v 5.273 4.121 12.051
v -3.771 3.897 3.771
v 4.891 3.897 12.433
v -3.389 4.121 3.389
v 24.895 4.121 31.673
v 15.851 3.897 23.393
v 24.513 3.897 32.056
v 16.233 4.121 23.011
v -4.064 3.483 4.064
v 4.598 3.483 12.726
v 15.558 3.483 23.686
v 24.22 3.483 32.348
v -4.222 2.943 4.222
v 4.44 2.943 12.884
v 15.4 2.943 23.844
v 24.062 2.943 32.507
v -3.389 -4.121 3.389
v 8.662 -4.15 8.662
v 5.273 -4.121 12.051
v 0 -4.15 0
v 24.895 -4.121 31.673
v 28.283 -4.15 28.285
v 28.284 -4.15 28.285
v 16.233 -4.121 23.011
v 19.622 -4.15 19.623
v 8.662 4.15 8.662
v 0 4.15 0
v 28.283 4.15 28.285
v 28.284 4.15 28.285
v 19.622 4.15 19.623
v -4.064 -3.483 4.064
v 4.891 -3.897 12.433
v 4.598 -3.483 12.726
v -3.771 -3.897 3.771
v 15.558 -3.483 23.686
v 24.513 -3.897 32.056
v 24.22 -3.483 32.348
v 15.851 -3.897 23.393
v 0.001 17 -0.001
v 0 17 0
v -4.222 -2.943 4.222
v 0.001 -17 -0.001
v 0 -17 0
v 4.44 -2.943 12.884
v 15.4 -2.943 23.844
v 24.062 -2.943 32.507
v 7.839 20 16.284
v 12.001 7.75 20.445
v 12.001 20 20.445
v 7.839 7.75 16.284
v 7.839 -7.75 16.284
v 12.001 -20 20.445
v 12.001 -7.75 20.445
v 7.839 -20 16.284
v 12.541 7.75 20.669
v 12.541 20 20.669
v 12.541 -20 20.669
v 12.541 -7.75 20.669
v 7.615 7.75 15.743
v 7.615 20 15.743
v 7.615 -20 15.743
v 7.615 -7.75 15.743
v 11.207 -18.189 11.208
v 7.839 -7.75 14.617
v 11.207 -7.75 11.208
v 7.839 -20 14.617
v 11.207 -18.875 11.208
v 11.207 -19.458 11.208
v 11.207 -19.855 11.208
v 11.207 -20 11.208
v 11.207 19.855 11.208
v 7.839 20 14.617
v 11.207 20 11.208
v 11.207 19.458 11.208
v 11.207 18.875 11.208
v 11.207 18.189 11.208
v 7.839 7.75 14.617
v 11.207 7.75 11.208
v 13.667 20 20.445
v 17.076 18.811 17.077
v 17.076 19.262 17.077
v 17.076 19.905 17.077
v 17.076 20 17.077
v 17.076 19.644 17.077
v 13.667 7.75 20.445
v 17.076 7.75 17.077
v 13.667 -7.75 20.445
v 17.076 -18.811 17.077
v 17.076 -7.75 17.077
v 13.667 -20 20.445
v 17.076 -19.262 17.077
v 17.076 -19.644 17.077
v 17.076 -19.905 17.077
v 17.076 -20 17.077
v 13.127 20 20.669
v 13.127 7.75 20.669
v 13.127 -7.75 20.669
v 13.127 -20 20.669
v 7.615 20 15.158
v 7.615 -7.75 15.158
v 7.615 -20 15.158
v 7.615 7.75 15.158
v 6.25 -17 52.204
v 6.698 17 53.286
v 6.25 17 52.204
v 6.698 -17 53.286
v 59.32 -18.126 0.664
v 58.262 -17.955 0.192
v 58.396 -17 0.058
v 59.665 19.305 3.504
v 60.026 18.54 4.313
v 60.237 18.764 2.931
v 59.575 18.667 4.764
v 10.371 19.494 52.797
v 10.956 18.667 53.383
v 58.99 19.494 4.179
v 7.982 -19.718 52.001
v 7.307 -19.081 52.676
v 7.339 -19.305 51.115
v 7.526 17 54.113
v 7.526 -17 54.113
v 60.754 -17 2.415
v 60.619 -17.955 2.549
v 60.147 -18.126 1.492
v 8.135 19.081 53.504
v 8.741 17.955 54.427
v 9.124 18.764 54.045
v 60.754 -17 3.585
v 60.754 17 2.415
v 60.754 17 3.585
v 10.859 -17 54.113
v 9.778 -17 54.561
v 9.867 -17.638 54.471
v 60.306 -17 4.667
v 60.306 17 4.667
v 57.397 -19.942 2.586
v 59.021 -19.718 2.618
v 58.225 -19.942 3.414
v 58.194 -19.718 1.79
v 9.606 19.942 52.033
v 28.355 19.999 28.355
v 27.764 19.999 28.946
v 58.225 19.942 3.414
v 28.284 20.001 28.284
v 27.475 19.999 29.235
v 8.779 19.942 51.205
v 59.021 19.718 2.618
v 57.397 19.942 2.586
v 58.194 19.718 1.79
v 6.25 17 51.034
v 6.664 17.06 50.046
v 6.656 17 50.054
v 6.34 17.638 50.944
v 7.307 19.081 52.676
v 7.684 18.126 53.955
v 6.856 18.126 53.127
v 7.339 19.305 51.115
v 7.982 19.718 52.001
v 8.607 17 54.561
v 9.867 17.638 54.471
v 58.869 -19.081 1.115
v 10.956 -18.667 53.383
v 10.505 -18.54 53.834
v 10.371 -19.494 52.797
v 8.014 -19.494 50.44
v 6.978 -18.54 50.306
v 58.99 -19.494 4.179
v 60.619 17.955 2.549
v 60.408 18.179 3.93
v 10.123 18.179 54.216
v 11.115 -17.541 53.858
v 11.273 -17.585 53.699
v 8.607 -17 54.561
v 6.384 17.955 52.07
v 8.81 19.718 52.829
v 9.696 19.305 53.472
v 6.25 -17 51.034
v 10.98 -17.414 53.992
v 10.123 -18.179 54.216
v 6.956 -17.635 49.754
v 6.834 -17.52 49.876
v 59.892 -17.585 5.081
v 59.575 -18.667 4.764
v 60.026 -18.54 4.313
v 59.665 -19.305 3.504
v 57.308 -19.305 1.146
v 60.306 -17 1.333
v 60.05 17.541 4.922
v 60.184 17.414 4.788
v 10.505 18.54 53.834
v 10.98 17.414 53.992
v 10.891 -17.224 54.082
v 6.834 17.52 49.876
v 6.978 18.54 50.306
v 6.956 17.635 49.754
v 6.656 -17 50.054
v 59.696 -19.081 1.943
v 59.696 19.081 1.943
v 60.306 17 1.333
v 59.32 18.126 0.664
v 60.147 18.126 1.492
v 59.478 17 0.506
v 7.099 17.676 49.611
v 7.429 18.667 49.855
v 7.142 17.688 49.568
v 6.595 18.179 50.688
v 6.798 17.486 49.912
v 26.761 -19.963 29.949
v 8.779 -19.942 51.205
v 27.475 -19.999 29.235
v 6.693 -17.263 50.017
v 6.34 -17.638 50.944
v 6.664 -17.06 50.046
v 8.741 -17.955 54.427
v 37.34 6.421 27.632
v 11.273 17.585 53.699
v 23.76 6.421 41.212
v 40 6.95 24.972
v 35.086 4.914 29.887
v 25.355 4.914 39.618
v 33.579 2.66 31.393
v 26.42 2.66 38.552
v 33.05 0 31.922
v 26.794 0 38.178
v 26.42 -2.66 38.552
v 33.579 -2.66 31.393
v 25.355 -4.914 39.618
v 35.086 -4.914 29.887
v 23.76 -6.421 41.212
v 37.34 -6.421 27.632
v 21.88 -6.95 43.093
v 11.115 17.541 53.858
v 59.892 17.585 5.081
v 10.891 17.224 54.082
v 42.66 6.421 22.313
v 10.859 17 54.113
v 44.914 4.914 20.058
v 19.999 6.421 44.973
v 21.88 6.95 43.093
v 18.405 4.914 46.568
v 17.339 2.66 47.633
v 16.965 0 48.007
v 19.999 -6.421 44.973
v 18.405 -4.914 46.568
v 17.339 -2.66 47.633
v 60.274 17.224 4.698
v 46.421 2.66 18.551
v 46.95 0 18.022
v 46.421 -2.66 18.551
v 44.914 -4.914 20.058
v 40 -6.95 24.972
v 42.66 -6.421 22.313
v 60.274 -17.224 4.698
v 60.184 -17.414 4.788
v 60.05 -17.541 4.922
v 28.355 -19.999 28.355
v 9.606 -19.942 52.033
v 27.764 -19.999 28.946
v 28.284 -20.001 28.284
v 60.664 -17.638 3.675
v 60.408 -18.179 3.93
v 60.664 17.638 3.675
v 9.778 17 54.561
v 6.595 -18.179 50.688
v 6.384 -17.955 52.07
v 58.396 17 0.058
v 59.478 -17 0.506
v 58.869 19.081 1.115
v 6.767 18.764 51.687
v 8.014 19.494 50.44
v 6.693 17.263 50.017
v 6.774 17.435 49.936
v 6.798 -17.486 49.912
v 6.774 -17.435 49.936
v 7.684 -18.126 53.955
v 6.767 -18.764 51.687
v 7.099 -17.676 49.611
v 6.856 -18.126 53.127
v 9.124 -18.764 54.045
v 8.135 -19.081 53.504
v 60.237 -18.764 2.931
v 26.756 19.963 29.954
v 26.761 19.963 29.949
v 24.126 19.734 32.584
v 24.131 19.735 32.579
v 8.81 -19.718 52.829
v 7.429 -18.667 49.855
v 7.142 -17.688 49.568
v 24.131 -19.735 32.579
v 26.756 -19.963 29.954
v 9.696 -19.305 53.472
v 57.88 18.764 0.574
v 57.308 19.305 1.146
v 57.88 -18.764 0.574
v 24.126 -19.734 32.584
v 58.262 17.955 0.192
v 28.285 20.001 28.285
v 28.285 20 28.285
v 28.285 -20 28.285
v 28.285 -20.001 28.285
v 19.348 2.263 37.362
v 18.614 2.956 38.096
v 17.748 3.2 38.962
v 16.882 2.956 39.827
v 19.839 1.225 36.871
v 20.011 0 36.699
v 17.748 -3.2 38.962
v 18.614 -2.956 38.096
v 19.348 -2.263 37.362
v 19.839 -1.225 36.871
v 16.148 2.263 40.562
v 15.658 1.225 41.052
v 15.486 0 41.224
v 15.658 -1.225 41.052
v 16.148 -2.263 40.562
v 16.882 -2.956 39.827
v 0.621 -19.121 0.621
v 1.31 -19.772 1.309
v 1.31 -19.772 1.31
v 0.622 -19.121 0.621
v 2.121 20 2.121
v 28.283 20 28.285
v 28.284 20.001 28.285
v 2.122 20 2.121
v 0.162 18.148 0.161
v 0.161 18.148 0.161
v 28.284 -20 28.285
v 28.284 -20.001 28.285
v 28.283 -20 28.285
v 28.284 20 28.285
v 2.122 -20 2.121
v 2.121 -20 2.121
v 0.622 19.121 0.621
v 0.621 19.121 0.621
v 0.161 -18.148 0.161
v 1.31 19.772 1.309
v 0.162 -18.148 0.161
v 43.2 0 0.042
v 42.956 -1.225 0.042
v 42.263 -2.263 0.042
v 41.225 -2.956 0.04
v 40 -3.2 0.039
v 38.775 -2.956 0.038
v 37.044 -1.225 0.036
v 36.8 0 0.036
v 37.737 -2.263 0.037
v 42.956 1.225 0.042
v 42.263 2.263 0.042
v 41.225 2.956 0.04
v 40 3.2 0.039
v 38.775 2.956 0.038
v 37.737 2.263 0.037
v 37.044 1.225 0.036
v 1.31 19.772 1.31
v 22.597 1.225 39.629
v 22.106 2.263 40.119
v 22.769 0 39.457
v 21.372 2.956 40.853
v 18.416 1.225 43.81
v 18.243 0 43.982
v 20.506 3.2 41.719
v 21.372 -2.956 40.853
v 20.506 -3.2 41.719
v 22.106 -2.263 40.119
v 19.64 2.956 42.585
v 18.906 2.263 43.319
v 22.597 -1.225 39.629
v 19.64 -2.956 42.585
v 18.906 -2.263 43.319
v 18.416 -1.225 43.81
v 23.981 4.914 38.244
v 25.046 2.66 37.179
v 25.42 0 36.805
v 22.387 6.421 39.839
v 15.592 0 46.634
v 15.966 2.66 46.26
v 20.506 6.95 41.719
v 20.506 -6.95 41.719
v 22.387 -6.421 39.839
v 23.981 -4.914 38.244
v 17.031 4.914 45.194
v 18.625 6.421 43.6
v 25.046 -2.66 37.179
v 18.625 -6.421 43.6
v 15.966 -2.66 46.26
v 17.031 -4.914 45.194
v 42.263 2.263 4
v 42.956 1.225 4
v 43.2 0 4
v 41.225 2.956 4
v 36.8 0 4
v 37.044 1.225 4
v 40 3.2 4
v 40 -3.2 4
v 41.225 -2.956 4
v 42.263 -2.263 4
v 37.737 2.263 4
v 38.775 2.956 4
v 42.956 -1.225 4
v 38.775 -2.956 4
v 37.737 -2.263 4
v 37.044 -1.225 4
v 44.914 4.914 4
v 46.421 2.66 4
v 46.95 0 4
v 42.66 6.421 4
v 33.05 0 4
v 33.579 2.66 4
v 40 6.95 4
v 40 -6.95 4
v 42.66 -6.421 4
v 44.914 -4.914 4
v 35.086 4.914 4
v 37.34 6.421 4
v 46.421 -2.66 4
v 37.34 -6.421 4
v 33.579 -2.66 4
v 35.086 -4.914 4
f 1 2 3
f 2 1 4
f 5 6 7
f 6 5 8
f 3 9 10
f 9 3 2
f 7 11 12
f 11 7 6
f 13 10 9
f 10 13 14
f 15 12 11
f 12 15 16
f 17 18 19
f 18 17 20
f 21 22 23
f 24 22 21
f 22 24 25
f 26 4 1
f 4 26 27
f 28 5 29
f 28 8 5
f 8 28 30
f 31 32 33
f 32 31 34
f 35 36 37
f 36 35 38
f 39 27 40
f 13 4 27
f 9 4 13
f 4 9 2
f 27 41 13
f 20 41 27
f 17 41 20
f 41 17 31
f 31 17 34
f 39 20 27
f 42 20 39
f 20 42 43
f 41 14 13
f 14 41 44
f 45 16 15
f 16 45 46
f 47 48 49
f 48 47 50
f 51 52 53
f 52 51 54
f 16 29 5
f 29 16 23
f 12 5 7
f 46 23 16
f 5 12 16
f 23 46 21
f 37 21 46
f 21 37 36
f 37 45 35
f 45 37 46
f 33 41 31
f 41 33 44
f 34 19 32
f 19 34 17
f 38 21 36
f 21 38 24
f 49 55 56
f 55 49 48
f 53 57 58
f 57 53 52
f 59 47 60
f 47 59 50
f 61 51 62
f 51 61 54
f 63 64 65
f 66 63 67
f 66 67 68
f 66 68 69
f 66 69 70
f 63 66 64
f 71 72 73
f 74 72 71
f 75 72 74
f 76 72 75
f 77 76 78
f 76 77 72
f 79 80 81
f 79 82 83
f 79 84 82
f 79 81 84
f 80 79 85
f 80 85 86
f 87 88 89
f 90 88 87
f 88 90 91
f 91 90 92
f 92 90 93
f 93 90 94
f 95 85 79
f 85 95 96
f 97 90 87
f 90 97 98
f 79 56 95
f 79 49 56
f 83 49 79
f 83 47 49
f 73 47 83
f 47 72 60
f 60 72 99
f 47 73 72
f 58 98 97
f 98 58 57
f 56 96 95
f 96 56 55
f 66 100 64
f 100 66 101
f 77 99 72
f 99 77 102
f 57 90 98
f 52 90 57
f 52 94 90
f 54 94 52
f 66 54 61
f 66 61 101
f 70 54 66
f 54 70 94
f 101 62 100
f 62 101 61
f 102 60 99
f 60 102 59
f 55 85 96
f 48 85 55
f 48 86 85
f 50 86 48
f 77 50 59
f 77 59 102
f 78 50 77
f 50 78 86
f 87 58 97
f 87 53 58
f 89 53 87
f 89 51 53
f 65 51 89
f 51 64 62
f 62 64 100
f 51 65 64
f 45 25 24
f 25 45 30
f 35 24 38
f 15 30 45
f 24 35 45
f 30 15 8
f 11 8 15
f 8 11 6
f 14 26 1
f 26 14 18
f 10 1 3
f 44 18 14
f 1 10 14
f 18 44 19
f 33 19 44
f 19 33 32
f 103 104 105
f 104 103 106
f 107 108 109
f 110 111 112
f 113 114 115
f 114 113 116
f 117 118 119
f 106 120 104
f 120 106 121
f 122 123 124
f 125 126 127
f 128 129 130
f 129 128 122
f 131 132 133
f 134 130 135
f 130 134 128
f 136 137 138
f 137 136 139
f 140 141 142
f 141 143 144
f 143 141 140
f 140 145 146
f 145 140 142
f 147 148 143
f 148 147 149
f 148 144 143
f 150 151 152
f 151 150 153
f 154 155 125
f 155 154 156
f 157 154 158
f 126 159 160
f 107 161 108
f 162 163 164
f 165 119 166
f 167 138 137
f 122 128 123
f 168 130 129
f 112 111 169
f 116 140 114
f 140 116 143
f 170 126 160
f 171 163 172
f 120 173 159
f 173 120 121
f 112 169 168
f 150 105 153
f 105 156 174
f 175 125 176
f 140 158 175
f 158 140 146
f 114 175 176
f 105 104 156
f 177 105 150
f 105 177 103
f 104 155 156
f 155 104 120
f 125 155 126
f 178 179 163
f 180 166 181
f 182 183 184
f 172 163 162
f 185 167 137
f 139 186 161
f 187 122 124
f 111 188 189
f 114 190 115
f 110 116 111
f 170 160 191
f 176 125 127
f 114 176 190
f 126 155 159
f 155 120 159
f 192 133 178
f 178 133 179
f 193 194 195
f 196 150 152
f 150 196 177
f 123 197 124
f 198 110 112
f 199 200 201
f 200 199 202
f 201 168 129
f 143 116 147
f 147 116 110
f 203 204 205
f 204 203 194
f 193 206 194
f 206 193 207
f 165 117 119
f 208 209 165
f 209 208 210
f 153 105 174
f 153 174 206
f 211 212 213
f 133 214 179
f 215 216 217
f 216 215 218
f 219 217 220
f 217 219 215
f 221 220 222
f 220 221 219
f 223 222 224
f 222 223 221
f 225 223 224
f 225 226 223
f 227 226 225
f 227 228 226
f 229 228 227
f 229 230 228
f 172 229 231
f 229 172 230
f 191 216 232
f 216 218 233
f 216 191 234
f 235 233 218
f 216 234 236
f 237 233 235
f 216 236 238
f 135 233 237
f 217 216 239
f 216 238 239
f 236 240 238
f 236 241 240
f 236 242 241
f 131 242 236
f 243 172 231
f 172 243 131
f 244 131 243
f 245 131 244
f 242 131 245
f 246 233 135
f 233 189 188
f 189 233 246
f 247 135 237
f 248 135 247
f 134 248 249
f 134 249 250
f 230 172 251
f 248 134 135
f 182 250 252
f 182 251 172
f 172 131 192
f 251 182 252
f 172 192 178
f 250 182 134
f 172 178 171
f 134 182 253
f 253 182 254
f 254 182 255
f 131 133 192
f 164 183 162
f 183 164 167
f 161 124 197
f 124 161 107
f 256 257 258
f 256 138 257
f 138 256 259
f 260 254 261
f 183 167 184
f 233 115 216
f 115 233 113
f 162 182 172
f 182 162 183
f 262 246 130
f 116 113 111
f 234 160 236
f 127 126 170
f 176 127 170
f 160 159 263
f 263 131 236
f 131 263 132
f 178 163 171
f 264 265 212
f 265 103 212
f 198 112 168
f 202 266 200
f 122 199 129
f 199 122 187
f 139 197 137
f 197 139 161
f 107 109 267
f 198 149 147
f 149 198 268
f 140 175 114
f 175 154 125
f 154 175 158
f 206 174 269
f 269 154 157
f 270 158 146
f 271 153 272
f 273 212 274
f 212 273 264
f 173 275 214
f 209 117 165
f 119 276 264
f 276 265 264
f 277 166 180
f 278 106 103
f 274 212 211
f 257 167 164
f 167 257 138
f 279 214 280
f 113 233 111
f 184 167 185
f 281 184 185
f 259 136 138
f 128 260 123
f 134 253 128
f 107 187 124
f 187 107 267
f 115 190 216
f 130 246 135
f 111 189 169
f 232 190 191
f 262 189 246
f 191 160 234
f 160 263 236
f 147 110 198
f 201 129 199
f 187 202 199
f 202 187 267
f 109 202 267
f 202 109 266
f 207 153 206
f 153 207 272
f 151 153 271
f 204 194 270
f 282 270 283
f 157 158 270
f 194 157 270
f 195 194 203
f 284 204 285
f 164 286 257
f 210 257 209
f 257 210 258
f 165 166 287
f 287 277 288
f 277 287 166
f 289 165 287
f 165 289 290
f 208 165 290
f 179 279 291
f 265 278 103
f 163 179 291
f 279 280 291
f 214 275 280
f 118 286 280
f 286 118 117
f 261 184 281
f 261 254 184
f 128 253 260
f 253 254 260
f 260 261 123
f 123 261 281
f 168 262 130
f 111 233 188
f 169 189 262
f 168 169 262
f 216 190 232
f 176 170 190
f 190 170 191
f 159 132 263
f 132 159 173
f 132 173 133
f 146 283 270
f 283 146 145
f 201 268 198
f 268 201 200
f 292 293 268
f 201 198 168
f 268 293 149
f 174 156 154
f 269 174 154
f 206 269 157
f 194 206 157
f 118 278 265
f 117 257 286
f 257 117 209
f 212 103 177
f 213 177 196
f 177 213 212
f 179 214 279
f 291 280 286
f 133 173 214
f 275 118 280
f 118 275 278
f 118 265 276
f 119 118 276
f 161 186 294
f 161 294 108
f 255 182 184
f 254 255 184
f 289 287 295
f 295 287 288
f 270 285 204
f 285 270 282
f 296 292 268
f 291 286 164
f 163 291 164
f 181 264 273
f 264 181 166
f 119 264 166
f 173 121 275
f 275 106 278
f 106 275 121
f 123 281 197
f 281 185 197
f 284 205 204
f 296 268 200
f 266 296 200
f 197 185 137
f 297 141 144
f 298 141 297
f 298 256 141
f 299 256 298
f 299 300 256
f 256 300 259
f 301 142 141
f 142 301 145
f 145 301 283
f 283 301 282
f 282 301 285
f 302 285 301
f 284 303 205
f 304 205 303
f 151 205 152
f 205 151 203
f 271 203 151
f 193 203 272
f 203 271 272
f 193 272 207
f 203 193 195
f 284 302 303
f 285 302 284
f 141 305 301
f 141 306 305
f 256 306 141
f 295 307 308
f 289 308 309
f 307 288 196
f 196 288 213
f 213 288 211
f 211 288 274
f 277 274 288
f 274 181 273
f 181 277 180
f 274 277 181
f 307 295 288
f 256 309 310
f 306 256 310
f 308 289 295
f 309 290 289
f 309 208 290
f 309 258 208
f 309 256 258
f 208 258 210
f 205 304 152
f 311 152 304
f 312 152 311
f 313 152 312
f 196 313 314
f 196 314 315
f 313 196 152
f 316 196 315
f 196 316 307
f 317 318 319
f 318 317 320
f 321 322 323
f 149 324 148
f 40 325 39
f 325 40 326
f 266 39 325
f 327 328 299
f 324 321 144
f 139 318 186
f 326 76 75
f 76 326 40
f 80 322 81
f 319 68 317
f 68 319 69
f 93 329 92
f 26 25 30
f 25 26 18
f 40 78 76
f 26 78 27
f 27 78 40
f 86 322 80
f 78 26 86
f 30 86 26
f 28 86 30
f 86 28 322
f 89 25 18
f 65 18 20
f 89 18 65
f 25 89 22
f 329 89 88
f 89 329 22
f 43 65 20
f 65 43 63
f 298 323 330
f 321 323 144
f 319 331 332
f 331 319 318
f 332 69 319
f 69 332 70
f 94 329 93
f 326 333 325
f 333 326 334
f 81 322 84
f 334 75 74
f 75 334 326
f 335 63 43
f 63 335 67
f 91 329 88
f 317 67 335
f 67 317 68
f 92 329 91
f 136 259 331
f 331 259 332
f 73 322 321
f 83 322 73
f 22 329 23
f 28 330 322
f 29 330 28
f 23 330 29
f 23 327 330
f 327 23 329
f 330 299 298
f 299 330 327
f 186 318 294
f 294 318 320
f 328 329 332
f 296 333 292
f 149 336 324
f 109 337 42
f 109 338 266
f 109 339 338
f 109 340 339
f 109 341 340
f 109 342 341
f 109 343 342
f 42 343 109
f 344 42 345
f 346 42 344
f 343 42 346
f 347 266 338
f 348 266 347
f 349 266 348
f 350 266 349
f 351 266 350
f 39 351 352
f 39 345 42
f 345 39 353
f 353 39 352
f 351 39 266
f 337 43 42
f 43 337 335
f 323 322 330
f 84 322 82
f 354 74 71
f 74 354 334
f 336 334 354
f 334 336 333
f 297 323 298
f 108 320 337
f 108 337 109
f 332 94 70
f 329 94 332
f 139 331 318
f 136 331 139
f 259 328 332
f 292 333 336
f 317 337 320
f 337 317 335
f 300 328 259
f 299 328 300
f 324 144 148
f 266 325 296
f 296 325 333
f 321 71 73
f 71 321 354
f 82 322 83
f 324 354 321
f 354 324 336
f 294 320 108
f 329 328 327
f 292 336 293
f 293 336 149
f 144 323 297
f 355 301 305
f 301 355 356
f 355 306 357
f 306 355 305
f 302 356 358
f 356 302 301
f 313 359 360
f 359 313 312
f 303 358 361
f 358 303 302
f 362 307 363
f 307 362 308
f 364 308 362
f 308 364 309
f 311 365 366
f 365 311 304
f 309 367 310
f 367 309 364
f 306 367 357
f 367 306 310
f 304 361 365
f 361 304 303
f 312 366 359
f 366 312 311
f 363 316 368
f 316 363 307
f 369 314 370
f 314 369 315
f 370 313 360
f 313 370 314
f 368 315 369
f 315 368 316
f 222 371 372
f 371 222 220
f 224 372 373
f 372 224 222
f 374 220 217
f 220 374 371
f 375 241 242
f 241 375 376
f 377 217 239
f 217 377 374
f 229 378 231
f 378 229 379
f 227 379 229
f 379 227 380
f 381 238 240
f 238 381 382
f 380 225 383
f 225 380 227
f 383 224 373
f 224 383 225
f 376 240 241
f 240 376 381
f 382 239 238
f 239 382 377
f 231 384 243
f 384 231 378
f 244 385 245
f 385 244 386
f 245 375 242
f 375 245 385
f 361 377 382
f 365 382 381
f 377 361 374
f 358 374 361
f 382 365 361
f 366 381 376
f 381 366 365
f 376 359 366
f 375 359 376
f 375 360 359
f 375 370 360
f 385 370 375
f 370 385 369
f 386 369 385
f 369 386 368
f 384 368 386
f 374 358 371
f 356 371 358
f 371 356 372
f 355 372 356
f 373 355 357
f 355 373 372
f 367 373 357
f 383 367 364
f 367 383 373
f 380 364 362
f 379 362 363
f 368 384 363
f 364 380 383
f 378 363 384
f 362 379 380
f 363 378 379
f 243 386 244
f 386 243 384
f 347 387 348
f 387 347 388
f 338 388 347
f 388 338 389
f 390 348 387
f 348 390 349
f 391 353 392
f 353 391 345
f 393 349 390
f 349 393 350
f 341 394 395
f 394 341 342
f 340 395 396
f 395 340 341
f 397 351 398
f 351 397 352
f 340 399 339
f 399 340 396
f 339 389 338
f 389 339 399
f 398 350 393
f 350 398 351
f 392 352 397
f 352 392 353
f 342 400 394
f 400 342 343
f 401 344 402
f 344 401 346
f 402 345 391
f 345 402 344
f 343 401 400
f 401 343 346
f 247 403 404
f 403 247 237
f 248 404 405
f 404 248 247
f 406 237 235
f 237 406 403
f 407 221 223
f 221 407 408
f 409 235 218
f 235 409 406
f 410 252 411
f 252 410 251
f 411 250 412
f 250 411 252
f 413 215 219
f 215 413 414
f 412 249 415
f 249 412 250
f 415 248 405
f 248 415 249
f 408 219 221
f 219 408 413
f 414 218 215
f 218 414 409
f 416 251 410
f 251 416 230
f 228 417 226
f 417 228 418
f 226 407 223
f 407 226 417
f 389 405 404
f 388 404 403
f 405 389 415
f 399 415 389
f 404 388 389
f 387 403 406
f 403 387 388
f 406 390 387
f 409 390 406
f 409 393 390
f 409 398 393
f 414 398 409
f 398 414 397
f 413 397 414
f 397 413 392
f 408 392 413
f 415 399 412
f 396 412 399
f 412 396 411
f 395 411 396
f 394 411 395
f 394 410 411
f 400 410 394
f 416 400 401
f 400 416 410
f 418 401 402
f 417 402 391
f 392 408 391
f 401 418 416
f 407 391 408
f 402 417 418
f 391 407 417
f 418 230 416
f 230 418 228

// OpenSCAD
$fn=16;

///// profile 2020
//	// profile width
//	prof=20;
//	//size of notches
//	h=5;
//	//rounding of edges
//	r=2;
//	//center skewed bolt
//	center = 0;
//	l = 30;
//	bolt = 5;
//	boltHead = 10.5;
//	//thickness of plastic under bolt head
//	boltPad = 2.15;
//	notchX = 5;
//	notchY = 6.4;
///// profile 2020

/// profile 4040
	// profile width
	prof=40;
	wall=5;
	//rounding of edges
	r=3;
	r2=1.5;
	//length of notches
	h=2*r;
	//center skewed bolt
	center = 0;
	l = 30;
	bolt = 6;
	boltHead = 13.5;
	//thickness of plastic under bolt head
	boltPad = 4;
	notch = [8.3, 15.5];
/// profile 4040

//compensation of overextrusion of printer
tol = 0.2;
gap = .1;
not = 0.001+0;
inf = 3*max(l,prof);

////////////////////////////////////////

rotate([0,45,0])
difference(){
	union(){
		translate([0,0,prof/2]) rotate([90,0,90]) translate([0,0,-h]) notches(h=h);

		wedge();
		body();
	}
	holes();
}

////////////////////////////////////////

module innerCube(h=10){
	w = prof-2*notchY;
	translate([0,0,h/2]) cube([w,w,h+not], true);
	if(center) translate([0,notchY/2,h/2]) cube([w,w+notchY,h+not], true);	
}

module notches(h=10){
	w=notch.x;
	difference(){
		union(){
			translate([-w/2,-prof/2,0]) cubeRounded([w,prof,h],r0=[r2,0,r2],r1=[r2,0,r2],r2=[r2,0,r2],r3=[r2,0,r2]);
			translate([-prof/2,-w/2,0]) cubeRounded([prof,w,h],r0=[0,r2,r2],r1=[0,r2,r2],r2=[0,r2,r2],r3=[0,r2,r2]);
		}
		translate([0,0,h/2]) cube([notch.y,notch.y,h], true);
	}
}

module holes(){
	translate([-l/2,0,prof+boltPad]) bolt();
	//translate([-prof/2+r+sqrt(boltPad)-sqrt(r),-sqrt(boltPad)+sqrt(r),prof/2]) rotate([90,0,45]) bolt();
		
	//rotate([0,-45,0]) translate([l/2+prof*sqrt(2),0,boltPad]) bolt();
	l2=center ? (prof/2*sqrt(2)) : prof;
	rotate([0,-45,0]) translate([l2,0,boltPad]) bolt();
}

module bolt(){
	translate([0,0,-inf+not]) cylinder(d=bolt+2*tol,h=inf);
	cylinder(d=boltHead+2*tol,h=inf);
}

module wedge(){
	hull(){
		translate([0,-prof/2+r,r]) rotate([0,90,0]) cylinder(r=r, h=not);
		translate([0,prof/2-r,r]) rotate([0,90,0]) cylinder(r=r, h=not);
		
		translate([0,-prof/2,prof]) sphere(r=not);
		translate([0,prof/2,prof]) sphere(r=not);		
		
		points1();
	}	
}

module body(){
	//#translate([0,-prof/2,prof]) cube([10,10,10]);
	
	difference(){
		hull(){	
			points1();
			
			translate([0,-prof/2,prof]) sphere(r=not);
			translate([0,prof/2,prof]) sphere(r=not);
		
			translate([-l,-prof/2+r,prof+r]) sphere(r=r);
			translate([-l,prof/2-r,prof+r]) sphere(r=r);
		}
		translate([-prof,-prof,prof-gap]) cube([prof,2*prof,2*gap]);

		//translate([-prof,-prof,prof+2*r-gap]) cube([3*prof,2*prof,2*gap]);
	}
}

module points1(){
	rn=r;
	translate([prof+rn-r*sqrt(2),-prof/2+rn,prof+rn]) sphere(r=rn);
	translate([prof+rn-r*sqrt(2),prof/2-rn,prof+rn]) sphere(r=rn);

//	translate([prof+r,-prof/2,prof+r]) sphere(r=not);
//	translate([prof+r,prof/2,prof+r]) sphere(r=not);
}

module cubeRounded(	
	size=[3,3,3],
	r=[0,0,0],
	r0=[-1,-1,-1],
	r1=[-1,-1,-1],
	r2=[-1,-1,-1],
	r3=[-1,-1,-1],
	r4=[-1,-1,-1],
	r5=[-1,-1,-1],
	r6=[-1,-1,-1],
	r7=[-1,-1,-1],
){
	
	function sat3(a) = [max(0,a.x),max(0,a.y),max(0,a.z)];
	function chg(a, b) = (a.x==-1 && a.y==-1 && a.z==-1) ? b : a;

	_r0 = sat3(chg(r0, r));
	_r1 = sat3(chg(r1, r));
	_r2 = sat3(chg(r2, r));
	_r3 = sat3(chg(r3, r));
	_r4 = sat3(chg(r4, r));
	_r5 = sat3(chg(r5, r));
	_r6 = sat3(chg(r6, r));
	_r7 = sat3(chg(r7, r));
		
	hull(){
		translate(_r0) scale(_r0) sphere(1);
		translate([size.x-_r1.x,_r1.y,_r1.z]) scale(_r1) sphere(1);
		translate([_r2.x,size.y-_r2.y,_r2.z]) scale(_r2) sphere(1);
		translate([size.x-_r3.x,size.y-_r3.y,_r3.z]) scale(_r3) sphere(1);

		translate([_r4.x,_r4.y,size.z-_r4.z]) scale(_r4) sphere(1);
		translate([size.x-_r5.x,_r5.y,size.z-_r5.z]) scale(_r5) sphere(1);
		translate([_r6.x,size.y-_r6.y,size.z-_r6.z]) scale(_r6) sphere(1);
		translate([size.x-_r7.x,size.y-_r7.y,size.z-_r7.z]) scale(_r7) sphere(1);
	}
}
